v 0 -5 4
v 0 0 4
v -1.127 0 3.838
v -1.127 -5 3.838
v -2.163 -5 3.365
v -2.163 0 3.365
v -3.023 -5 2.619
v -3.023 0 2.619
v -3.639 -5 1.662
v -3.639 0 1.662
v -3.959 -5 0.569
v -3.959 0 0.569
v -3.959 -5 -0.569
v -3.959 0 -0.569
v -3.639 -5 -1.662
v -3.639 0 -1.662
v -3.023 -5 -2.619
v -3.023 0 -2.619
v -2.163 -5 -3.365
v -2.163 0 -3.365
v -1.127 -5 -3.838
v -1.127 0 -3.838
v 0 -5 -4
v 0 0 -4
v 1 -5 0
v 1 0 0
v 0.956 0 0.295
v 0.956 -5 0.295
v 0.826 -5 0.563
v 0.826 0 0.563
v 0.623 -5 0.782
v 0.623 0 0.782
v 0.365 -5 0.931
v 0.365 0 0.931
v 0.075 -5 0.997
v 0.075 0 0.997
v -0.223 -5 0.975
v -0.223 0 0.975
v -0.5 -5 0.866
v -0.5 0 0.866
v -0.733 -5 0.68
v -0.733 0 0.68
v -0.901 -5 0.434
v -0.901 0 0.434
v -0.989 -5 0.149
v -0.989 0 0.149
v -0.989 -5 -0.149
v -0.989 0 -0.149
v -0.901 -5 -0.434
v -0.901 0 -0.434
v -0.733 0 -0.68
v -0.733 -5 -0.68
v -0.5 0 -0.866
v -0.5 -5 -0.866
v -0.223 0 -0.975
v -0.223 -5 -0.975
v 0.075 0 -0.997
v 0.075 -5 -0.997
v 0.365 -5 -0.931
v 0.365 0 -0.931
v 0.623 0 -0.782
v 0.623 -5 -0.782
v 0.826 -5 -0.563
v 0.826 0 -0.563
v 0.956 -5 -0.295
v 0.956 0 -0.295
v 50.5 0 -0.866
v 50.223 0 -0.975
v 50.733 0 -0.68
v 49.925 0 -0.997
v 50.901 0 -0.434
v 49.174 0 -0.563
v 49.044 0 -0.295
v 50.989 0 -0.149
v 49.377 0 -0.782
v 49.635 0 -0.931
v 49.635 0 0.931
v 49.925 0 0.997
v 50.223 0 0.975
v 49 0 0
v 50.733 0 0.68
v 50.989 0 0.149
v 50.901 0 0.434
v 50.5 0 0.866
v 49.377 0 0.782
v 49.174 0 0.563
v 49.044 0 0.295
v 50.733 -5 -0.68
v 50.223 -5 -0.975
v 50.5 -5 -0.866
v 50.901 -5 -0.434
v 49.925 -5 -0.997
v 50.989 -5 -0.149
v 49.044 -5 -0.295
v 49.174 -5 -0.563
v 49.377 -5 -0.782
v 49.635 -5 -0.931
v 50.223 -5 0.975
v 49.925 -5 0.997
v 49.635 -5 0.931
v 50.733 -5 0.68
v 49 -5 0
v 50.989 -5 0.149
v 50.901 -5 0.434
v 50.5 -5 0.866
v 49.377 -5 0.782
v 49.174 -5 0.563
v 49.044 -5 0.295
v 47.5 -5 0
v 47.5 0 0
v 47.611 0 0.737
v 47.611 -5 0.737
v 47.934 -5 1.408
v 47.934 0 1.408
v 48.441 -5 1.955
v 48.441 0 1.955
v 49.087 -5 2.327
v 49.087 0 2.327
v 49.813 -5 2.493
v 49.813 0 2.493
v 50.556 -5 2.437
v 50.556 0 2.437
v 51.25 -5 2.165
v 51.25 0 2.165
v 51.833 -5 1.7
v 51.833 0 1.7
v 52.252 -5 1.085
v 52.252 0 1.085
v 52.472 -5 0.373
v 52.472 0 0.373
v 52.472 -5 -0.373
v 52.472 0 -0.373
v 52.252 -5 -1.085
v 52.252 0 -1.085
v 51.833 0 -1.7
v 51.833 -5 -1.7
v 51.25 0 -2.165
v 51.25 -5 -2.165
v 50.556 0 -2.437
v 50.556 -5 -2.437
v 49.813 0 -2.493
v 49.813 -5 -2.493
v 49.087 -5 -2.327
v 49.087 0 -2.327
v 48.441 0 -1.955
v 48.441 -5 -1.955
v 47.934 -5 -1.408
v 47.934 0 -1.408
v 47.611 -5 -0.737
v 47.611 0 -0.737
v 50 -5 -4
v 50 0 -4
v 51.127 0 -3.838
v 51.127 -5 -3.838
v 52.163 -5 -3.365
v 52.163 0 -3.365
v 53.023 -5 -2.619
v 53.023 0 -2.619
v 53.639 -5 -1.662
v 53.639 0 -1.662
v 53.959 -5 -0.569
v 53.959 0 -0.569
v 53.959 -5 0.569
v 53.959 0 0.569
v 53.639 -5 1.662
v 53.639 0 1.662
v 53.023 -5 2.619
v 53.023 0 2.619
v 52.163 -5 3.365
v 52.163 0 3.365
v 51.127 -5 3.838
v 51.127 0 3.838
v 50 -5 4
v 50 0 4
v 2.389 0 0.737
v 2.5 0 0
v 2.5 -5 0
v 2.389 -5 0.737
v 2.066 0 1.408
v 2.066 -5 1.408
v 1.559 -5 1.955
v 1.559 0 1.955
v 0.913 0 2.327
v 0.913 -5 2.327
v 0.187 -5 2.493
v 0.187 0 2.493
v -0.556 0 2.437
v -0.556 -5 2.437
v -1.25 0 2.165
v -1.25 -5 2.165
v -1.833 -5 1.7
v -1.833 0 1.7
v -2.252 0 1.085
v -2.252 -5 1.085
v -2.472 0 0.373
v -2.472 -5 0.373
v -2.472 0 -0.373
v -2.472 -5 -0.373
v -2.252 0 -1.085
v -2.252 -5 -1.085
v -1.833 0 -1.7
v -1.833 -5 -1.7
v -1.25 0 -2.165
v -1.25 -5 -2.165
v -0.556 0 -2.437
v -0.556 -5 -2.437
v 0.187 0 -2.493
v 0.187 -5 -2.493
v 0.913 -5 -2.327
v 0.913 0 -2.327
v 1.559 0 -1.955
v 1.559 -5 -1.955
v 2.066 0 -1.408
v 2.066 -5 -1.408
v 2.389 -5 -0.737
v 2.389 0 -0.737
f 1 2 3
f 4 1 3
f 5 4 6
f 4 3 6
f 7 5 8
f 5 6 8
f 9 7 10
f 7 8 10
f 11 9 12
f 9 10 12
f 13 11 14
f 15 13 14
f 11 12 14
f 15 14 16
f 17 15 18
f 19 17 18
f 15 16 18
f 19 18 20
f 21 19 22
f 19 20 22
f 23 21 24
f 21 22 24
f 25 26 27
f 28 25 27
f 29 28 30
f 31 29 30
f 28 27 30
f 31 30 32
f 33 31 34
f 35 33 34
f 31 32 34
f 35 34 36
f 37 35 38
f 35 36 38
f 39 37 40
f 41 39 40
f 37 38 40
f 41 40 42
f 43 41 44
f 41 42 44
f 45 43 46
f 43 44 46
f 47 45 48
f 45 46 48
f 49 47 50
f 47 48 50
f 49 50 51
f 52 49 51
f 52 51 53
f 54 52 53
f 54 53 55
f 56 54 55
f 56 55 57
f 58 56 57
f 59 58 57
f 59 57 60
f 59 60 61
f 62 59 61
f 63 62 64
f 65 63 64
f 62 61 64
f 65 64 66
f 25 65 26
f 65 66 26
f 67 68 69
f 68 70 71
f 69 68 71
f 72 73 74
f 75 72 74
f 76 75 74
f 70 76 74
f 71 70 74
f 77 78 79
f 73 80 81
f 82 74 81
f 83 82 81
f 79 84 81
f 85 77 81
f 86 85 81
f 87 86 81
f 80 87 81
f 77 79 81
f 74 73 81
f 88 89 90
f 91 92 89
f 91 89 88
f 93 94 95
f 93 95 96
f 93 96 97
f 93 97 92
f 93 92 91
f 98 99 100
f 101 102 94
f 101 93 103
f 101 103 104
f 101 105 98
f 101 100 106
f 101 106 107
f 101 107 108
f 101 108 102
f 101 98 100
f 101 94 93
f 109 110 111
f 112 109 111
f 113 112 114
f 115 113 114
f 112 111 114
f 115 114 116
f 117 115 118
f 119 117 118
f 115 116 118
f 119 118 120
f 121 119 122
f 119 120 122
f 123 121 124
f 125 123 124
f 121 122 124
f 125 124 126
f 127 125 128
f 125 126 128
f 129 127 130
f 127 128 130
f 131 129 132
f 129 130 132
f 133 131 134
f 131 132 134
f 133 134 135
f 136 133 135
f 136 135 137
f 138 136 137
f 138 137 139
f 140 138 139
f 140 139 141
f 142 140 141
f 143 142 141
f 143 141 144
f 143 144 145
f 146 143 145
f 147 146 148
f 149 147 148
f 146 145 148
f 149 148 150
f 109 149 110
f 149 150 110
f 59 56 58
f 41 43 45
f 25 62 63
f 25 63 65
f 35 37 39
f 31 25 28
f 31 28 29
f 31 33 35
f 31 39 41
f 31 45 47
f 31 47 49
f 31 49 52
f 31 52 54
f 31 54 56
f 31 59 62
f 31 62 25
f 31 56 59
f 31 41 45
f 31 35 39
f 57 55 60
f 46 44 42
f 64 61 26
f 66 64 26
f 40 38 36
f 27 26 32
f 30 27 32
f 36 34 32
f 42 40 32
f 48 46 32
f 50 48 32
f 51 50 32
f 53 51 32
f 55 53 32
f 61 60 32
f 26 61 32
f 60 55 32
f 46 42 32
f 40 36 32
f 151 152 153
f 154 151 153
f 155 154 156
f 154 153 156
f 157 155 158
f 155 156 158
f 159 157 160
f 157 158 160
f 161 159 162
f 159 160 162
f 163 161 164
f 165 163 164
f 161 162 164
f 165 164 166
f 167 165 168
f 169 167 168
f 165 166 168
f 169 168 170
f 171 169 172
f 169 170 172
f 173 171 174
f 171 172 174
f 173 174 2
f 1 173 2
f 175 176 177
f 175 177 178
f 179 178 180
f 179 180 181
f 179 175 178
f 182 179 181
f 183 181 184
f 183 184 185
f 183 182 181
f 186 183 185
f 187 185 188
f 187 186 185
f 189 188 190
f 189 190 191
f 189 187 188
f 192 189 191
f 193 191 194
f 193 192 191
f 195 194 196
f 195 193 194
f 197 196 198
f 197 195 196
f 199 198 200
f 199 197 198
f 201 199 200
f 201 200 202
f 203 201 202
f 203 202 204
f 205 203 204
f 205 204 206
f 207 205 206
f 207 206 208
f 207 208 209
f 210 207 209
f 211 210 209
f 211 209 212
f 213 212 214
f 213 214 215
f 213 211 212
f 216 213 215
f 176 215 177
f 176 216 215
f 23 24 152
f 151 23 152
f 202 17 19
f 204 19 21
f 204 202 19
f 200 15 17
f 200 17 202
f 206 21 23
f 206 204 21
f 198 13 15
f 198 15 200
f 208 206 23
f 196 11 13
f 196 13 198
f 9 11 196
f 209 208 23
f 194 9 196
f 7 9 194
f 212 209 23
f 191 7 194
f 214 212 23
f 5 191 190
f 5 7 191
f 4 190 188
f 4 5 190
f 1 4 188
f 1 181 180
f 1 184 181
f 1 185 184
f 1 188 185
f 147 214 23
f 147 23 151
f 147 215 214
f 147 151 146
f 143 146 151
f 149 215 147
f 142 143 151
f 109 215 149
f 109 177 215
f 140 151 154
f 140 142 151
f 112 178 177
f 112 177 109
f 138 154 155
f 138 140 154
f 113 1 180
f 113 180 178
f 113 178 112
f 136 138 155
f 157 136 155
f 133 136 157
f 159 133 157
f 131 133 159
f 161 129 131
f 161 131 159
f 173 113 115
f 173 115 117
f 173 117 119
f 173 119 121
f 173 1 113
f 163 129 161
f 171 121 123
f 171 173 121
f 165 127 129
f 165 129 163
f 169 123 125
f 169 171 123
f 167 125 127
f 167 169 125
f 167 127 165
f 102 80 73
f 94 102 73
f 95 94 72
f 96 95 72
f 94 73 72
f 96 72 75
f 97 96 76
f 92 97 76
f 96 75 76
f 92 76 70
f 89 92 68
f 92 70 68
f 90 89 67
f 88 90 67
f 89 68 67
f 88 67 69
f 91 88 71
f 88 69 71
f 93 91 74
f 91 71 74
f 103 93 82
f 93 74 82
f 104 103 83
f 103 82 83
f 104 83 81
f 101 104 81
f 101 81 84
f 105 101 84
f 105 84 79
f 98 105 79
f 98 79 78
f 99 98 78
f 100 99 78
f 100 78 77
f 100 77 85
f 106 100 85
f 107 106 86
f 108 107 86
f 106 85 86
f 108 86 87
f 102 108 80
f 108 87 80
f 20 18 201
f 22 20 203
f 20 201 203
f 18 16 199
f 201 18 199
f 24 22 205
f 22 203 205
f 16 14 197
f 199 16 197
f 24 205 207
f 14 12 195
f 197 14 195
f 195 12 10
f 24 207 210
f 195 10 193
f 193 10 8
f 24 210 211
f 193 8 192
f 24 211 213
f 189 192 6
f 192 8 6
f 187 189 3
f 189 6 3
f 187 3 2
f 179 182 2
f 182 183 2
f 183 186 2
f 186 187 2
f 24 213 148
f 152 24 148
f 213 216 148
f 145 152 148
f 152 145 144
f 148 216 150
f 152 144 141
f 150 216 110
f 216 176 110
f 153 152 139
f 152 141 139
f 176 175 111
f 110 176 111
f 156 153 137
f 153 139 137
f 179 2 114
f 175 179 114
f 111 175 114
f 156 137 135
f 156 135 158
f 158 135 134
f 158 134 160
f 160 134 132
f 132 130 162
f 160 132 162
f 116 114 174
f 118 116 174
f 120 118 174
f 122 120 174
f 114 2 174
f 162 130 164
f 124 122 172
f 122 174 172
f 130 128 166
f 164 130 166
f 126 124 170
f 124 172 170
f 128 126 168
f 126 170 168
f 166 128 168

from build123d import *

# Parameters (mm, degrees)
F0_R     = 1
F1_DEPTH = 5
F0_R_2   = 2.5


with BuildPart() as f1:
    # F0 (on Front) → F1 (new body)
    with BuildSketch(Plane.XZ):
        Circle(F0_R)
    extrude(amount=F1_DEPTH)


with BuildPart() as f1b:
    # F0 (on Front) → F1, piece 2 (new body)
    with BuildSketch(Plane.XZ):
        with BuildLine():
            Line((50, 4), (0, 4))
            ThreePointArc((0, 4), (-4, 0), (0, -4))
            Line((0, -4), (50, -4))
            ThreePointArc((50, -4), (54, 0), (50, 4))
        make_face()
        Circle(F0_R_2, mode=Mode.SUBTRACT)
        with BuildLine():
            ThreePointArc((52.5, 0), (50, -2.5), (47.5, 0))
            ThreePointArc((47.5, 0), (50, 2.5), (52.5, 0))
        make_face(mode=Mode.SUBTRACT)
    extrude(amount=F1_DEPTH)


with BuildPart() as f1c:
    # F0 (on Front) → F1, piece 3 (new body)
    with BuildSketch(Plane.XZ):
        with BuildLine():
            ThreePointArc((51, 0), (50, 1), (49, 0))
            ThreePointArc((49, 0), (50, -1), (51, 0))
        make_face()
    extrude(amount=F1_DEPTH)


solid = Compound([f1.part, f1b.part, f1c.part])
